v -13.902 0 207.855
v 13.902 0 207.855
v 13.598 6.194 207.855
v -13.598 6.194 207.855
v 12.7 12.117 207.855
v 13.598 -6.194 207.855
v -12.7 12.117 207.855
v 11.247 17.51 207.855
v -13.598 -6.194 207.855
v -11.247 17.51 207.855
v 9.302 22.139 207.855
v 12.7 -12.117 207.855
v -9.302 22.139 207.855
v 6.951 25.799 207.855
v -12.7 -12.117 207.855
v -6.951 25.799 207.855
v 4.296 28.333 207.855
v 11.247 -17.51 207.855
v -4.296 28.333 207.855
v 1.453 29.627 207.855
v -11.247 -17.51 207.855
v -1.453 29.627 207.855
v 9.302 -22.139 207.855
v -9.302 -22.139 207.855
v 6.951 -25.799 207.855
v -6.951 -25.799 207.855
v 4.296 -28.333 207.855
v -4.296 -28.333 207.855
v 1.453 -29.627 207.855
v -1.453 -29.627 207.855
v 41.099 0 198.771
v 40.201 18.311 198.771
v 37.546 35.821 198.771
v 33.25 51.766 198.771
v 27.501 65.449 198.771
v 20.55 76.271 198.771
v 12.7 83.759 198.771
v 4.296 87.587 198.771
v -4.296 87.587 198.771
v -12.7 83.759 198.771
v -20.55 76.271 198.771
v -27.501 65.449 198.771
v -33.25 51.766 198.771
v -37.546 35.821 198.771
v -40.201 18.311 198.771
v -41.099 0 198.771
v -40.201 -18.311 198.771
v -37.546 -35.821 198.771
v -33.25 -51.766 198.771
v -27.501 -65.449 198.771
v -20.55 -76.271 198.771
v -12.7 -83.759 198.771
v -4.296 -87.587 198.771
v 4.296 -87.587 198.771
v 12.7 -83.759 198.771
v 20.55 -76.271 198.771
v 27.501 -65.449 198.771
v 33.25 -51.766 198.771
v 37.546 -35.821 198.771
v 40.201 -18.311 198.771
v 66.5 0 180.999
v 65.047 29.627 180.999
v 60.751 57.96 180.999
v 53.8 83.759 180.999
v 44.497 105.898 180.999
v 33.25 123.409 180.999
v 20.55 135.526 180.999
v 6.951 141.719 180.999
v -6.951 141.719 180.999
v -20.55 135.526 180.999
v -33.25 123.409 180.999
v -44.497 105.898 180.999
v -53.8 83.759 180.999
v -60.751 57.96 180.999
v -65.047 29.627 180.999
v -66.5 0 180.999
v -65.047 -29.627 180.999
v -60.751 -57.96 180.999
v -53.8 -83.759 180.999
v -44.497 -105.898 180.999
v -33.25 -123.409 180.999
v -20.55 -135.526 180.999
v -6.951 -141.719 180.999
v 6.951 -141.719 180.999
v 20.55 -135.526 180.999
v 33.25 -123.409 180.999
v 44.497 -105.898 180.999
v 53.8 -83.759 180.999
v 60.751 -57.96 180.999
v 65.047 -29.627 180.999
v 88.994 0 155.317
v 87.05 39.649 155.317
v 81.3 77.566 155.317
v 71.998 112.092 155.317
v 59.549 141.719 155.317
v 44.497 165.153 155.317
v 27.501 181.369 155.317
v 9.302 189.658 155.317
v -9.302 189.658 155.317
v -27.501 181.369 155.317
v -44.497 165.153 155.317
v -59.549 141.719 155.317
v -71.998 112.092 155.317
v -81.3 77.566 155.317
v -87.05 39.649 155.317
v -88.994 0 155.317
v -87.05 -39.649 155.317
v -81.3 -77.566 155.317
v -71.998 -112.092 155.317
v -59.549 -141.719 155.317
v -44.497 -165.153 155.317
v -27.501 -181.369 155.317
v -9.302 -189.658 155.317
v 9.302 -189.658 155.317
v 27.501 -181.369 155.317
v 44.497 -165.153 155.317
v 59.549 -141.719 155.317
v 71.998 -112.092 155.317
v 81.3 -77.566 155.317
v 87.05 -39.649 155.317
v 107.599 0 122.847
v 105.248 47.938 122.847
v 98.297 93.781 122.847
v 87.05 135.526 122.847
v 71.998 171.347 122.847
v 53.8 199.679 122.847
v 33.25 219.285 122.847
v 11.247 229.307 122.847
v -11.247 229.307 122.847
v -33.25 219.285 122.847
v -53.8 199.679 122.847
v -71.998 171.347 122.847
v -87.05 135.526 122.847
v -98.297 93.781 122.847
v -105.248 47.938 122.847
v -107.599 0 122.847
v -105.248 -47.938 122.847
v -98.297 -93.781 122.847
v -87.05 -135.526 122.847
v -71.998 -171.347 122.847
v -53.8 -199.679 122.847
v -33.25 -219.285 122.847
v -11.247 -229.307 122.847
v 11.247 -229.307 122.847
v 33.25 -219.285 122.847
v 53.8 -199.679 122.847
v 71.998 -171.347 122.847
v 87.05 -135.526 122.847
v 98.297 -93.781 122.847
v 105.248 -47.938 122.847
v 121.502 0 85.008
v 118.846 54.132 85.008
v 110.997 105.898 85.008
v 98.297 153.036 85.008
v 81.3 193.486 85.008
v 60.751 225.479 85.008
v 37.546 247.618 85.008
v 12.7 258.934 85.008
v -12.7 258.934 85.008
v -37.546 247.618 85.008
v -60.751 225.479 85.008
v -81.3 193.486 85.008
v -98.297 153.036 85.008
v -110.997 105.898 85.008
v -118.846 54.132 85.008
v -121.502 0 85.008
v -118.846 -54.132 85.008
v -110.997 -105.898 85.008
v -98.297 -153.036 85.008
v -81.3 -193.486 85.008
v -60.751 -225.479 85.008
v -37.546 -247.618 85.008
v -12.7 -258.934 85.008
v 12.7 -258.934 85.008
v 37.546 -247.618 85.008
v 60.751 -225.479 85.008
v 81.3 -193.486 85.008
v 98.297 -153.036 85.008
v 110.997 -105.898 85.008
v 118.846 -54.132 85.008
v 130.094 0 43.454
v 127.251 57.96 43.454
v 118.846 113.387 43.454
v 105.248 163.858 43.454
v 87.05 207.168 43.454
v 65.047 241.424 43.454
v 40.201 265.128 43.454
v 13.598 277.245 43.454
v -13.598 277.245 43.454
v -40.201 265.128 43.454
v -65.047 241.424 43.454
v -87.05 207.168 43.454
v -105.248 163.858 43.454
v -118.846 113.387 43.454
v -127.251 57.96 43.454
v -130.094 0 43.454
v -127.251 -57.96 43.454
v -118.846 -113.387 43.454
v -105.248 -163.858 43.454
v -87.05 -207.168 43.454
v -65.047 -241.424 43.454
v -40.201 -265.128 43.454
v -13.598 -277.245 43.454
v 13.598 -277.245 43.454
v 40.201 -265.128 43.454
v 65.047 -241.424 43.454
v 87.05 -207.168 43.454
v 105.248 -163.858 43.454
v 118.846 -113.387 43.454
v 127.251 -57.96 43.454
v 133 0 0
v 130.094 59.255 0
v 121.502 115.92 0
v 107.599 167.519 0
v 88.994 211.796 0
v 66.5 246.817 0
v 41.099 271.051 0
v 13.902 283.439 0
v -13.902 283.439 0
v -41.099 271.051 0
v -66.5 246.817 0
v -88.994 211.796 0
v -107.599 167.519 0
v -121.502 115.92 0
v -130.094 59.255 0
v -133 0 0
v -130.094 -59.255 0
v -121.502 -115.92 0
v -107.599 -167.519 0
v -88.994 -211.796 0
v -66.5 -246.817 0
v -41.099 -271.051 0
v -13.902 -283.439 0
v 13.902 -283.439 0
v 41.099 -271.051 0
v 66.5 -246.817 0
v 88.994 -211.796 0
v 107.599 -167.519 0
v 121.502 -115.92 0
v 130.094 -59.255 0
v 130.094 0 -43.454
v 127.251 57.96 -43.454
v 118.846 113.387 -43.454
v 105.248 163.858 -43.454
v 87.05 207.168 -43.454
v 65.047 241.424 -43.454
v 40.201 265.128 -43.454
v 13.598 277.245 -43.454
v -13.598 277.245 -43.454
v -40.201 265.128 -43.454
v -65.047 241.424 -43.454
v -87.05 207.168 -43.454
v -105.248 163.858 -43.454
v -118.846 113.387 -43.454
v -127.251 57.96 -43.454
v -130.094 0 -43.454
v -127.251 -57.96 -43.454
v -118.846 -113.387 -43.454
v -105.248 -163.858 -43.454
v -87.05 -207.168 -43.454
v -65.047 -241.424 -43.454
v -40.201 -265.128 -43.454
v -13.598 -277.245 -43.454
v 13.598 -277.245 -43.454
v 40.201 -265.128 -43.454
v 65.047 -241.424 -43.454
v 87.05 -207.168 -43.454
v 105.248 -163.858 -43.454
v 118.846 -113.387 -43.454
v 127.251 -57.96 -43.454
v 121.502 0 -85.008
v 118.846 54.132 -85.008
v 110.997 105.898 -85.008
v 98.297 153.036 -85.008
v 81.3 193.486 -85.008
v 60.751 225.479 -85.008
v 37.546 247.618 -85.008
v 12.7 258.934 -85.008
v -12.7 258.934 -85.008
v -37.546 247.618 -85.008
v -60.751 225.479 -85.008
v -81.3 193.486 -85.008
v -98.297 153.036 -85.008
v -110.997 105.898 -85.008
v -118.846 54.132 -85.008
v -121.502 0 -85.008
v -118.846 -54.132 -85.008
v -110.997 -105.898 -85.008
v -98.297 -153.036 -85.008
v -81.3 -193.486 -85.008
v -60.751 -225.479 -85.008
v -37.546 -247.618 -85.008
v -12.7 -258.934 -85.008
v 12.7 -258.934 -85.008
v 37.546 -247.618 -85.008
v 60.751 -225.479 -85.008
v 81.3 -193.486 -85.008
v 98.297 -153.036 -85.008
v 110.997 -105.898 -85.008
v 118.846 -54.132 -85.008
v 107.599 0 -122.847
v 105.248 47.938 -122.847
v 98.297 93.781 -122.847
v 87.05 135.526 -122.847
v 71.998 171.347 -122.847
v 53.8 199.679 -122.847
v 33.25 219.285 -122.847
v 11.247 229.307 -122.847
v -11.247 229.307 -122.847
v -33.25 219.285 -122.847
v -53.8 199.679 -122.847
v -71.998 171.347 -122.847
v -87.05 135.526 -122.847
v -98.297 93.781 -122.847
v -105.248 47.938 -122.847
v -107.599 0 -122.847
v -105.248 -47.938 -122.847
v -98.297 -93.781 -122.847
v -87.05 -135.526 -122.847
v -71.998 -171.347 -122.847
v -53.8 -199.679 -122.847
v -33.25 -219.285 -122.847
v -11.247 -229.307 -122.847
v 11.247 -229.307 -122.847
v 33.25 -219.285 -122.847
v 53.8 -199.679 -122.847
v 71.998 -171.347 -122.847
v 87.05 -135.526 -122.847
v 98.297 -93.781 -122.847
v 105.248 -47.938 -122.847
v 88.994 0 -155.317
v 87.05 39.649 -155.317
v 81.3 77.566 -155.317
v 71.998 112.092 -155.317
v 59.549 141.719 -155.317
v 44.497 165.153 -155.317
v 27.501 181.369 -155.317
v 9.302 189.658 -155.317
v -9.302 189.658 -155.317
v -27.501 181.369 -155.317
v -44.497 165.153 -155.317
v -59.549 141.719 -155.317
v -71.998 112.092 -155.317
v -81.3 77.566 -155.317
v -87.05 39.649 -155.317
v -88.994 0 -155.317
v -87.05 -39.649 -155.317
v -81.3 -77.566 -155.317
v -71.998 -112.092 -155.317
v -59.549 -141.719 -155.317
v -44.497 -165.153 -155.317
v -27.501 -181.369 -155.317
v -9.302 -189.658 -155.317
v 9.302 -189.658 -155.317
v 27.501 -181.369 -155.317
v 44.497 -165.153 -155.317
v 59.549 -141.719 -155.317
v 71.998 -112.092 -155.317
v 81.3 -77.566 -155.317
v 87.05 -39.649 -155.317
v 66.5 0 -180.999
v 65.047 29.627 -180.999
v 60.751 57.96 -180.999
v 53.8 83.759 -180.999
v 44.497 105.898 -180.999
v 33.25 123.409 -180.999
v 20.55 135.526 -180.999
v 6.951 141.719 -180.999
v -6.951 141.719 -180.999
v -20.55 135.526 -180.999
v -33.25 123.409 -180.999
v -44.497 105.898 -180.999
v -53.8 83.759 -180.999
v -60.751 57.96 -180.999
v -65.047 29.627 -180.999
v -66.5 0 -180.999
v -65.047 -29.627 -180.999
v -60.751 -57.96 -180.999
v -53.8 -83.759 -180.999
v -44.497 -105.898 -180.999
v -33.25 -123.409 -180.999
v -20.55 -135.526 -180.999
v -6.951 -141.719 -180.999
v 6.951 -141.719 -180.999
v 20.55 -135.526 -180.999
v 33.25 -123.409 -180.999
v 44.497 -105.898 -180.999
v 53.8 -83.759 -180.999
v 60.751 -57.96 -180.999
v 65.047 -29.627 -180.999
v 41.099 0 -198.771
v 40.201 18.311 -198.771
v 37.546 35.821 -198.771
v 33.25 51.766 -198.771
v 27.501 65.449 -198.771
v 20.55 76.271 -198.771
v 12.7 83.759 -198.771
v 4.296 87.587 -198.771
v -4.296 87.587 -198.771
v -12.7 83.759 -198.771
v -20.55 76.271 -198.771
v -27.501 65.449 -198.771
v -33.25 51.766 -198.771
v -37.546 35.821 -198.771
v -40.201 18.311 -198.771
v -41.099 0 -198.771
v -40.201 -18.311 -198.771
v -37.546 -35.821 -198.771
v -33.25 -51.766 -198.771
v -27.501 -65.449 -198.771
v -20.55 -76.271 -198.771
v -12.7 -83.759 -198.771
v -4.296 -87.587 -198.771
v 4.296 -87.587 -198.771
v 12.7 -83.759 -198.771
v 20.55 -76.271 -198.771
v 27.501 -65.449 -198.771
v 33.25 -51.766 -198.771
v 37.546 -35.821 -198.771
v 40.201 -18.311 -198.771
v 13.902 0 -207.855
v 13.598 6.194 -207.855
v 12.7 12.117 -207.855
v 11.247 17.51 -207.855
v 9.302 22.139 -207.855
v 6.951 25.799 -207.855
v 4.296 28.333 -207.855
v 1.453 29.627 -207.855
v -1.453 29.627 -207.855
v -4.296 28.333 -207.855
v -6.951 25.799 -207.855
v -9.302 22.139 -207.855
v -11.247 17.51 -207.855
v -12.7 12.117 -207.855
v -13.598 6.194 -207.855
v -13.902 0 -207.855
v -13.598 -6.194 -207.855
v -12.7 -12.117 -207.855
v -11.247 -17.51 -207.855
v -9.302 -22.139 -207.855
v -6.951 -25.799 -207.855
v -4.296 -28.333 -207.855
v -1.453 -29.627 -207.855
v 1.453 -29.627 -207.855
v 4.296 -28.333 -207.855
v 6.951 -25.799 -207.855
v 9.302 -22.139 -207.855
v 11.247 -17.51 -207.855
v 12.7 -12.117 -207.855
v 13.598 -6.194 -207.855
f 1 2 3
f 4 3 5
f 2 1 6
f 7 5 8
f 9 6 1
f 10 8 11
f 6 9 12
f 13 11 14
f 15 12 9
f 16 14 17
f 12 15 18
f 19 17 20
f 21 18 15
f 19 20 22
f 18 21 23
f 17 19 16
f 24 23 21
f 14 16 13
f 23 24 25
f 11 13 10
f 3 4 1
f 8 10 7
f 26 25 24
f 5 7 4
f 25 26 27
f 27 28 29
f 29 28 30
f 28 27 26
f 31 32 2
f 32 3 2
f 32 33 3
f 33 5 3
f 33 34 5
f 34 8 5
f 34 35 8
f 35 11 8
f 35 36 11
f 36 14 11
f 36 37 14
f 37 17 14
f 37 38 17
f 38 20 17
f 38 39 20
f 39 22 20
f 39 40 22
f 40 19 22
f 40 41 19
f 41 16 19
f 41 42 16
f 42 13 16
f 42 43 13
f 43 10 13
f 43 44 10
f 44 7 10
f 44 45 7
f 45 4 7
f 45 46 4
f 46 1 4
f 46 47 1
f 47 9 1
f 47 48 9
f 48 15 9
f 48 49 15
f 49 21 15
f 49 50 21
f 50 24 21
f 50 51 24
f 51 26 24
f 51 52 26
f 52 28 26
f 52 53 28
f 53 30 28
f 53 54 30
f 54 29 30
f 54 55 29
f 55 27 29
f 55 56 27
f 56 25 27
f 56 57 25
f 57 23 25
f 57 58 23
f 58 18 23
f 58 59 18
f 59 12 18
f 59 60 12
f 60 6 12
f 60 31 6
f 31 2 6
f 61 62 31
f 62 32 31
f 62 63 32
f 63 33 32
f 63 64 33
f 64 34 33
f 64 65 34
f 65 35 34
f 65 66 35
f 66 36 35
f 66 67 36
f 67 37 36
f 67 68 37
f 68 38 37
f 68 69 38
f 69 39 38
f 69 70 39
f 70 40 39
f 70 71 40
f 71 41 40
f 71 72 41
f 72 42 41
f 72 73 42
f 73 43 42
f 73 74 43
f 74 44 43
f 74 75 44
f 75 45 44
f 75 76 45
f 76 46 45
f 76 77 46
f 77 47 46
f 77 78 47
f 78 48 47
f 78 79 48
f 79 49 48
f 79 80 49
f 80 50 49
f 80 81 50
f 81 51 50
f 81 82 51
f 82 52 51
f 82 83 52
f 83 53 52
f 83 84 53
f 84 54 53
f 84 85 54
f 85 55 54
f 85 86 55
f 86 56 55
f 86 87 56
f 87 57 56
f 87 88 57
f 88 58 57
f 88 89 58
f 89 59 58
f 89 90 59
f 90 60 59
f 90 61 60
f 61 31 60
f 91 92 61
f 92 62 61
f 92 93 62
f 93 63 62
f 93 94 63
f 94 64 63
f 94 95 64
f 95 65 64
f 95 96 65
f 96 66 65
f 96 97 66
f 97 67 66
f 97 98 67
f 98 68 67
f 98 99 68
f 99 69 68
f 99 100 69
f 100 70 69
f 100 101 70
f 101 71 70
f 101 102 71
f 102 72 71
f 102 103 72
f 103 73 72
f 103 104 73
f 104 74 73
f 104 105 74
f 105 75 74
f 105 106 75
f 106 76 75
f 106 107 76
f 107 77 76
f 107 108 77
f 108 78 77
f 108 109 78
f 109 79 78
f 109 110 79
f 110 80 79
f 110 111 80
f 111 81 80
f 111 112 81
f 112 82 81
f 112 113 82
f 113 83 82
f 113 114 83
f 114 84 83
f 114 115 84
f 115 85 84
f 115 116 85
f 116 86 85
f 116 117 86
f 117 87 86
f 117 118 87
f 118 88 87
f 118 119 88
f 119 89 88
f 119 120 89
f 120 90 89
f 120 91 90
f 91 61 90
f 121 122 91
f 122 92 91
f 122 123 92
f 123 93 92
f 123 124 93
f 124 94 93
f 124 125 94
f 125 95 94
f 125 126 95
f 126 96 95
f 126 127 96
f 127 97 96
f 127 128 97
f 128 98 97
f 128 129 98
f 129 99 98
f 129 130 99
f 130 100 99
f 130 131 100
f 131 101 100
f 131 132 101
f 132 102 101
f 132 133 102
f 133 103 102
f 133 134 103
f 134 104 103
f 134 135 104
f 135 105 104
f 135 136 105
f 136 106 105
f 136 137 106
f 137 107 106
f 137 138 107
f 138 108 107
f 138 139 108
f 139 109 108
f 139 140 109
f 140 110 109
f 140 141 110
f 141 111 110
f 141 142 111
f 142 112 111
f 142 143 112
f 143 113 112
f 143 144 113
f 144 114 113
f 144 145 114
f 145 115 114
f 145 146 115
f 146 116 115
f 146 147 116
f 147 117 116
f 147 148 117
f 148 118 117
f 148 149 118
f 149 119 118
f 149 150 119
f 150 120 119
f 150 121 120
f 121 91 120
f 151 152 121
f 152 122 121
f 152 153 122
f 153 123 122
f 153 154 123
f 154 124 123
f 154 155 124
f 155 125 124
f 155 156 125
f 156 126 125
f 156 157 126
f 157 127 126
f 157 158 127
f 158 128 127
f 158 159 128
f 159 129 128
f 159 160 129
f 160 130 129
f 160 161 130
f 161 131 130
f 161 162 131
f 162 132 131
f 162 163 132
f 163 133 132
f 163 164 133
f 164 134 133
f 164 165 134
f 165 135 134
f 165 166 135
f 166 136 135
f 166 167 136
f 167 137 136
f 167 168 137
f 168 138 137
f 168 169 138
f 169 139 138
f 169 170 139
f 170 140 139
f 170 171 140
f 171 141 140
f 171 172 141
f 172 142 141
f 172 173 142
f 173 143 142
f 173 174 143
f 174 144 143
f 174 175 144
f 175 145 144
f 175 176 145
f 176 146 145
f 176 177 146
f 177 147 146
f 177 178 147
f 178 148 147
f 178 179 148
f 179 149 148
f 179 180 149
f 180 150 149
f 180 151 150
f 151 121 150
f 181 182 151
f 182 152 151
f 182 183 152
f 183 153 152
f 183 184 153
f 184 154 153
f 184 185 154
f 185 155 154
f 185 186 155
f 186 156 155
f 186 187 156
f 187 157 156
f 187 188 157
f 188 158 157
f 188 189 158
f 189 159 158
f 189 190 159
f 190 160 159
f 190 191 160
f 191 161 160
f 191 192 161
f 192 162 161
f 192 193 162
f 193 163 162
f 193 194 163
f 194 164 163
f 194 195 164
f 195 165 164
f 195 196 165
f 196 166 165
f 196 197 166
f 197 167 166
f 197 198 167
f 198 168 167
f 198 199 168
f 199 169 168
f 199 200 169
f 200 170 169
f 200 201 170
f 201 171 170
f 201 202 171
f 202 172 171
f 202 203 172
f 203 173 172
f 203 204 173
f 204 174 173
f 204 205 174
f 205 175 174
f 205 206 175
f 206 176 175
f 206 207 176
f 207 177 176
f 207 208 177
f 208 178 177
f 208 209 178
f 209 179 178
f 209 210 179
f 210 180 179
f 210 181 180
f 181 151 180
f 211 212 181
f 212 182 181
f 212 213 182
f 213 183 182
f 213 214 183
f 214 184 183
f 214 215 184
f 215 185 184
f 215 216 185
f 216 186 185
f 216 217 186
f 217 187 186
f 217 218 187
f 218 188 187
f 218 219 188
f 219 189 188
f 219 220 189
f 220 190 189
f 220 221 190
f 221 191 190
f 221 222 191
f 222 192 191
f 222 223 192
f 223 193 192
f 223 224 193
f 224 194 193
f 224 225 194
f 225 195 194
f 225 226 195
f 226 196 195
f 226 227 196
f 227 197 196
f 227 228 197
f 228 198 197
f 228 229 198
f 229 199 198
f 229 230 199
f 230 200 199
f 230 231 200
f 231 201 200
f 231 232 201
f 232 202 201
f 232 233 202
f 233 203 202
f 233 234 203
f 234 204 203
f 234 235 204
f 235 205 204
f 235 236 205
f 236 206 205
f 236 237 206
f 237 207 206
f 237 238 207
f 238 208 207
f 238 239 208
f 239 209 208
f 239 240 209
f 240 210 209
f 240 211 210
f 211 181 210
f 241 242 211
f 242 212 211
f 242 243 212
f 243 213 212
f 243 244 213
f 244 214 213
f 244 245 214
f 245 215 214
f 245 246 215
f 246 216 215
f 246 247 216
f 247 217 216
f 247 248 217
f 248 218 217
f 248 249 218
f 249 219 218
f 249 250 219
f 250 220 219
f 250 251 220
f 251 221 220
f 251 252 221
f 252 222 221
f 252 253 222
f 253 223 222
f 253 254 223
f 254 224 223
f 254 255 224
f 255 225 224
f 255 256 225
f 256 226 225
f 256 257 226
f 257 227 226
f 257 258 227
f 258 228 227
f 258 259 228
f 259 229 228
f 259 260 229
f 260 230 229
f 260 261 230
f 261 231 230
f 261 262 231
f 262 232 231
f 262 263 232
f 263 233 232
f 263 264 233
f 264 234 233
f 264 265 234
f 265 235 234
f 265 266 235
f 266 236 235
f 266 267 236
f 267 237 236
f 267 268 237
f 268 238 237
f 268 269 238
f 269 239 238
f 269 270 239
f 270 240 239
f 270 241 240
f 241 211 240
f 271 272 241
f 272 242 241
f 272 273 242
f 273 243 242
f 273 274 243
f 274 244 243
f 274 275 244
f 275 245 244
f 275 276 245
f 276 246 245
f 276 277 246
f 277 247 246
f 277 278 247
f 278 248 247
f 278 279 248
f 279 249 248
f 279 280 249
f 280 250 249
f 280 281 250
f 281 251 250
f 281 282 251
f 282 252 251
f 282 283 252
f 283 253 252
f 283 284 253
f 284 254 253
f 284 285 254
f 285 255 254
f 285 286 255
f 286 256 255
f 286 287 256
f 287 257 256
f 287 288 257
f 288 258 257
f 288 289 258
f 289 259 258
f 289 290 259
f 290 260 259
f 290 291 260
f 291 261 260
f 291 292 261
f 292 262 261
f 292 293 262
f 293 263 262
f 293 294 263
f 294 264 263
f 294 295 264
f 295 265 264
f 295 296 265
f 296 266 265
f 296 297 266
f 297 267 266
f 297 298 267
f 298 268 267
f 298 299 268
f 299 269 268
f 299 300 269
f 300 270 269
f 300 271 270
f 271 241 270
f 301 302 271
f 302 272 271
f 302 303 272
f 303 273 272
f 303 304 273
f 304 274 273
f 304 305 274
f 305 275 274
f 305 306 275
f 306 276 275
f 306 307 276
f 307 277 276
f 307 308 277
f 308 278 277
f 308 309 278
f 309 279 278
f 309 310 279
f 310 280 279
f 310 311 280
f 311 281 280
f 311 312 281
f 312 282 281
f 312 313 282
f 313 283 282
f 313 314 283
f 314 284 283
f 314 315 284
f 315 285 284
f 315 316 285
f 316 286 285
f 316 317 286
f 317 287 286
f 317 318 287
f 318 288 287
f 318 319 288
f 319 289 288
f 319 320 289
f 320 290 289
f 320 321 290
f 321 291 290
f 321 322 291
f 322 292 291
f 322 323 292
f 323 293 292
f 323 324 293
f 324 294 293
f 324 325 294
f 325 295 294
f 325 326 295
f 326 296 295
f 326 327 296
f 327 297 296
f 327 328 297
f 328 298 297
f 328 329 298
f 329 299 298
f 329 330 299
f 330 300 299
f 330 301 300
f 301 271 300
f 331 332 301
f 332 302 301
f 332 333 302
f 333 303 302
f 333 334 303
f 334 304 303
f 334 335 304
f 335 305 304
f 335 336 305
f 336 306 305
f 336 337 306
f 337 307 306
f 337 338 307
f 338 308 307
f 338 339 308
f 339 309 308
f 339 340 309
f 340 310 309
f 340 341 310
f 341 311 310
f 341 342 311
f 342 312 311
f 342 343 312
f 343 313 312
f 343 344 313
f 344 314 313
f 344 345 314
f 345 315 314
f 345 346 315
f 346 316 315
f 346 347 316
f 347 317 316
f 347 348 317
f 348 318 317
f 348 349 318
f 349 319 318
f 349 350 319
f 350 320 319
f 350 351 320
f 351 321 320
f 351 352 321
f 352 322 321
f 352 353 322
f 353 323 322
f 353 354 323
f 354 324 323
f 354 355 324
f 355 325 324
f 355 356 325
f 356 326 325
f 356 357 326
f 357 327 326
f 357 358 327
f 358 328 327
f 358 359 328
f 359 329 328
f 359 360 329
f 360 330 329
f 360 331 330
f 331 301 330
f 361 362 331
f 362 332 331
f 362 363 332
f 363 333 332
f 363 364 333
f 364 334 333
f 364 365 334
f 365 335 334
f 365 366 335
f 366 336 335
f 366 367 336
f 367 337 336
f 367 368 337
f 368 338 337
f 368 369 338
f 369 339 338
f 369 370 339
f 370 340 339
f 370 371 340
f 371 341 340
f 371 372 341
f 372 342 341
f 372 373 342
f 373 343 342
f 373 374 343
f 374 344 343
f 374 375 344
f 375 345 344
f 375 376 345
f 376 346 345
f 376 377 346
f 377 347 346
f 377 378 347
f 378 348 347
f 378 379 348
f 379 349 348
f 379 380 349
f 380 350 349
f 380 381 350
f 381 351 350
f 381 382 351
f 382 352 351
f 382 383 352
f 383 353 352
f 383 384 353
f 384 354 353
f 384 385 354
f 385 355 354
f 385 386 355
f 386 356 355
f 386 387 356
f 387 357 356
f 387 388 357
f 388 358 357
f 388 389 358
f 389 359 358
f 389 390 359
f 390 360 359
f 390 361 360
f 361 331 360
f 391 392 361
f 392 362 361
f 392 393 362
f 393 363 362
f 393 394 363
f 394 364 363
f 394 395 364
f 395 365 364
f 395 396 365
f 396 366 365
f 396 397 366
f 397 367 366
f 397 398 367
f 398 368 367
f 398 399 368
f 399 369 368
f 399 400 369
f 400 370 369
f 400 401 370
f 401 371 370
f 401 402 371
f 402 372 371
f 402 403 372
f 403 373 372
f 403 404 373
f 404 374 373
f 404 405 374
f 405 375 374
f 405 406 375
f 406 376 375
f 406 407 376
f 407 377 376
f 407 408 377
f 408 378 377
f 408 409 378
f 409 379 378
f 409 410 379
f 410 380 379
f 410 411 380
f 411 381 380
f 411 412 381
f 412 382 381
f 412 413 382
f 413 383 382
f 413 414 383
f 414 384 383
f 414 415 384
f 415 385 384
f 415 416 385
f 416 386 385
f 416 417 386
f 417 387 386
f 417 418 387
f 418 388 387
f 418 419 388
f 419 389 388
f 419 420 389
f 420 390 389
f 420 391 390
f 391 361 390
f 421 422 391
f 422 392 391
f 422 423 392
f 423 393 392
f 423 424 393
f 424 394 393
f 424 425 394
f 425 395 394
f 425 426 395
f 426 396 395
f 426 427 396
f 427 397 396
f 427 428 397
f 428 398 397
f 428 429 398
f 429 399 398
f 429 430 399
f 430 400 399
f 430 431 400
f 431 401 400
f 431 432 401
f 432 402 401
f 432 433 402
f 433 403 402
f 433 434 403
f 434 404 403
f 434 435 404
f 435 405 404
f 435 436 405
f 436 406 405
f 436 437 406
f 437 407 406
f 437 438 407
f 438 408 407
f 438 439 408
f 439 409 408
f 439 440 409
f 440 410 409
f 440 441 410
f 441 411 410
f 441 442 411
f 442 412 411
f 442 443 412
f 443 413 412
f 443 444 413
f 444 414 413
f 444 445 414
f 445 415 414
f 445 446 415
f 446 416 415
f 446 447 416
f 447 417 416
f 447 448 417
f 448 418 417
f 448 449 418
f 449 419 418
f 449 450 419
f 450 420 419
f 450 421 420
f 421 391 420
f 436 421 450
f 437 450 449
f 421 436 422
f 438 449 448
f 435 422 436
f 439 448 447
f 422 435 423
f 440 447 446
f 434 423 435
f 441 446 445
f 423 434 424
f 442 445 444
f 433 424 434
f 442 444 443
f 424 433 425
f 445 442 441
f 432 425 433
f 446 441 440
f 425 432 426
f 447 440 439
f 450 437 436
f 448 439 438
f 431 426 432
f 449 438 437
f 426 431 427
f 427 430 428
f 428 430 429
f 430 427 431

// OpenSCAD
// Generated by SolidPython 1.0.1 on 2020-07-29 00:46:48


scale(v = [7, 15, 11]) {
	sphere(r = 19);
}
/***********************************************
*********      SolidPython code:      **********
************************************************
 
# import packages: SolidPython
from solid import *
from solid.utils import *
from itertools import chain, combinations, permutations


class Resize:

    def __init__(self, scad_file):
        self.scad_file = scad_file
        #self.scad_file = import_scad(scad_file)
        # cone/cylinder param:
        self.r1 = 0
        self.r2 = 0
        self.h = 0
        # rectangular prism param:
        self.w = 0
        self.l = 0
        # ellipse param:
        self.r = 0

    # import OpenScad code (file name corresponds to shape)


    # classify shape + parameters
    def assign(self, param1, param2, param3):
        if self.scad_file == 'cone.scad':
            self.r1 = param1
            self.r2 = param2
            self.h = param3
        elif self.scad_file == 'cylinder.scad':
            self.r1 = param1
            self.r2 = param2
            self.h = param3
        elif self.scad_file == 'rectangularPrism.scad':
            self.h = param1
            self.l = param2
            self.w = param3
        else:
            self.r = param1
            self.h = param2

    # resize parameters
    def iterate(self):
        x = range(3, 20, 2)
        i = 1
        if self.scad_file == 'cone.scad':
            tempList = list(permutations(x, 2))
            for temp in tempList:
                param1 = temp[0]
                param2 = temp[1]
                filepath = 'produced_scad_files/' + 'cone' + str(param1) + '_' + str(param2) + '_' + '.scad'
                scad_render_to_file(cylinder(h=param1, r1=param2, r2=0), filepath)

        elif self.scad_file == 'cylinder.scad':
            tempList = list(permutations(x, 3))
            for temp in tempList:
                param1 = temp[0]
                param2 = temp[1]
                filepath = 'produced_scad_files/' + 'cylinder' + str(param1) + '_' + str(param2) + '_' + '.scad'
                scad_render_to_file(cylinder(h=param1, r1=param2, r2=param2), filepath)

        elif self.scad_file == 'rectangularPrism.scad':
            tempList = list(permutations(x, 3))
            for temp in tempList:
                param1 = temp[0]
                param2 = temp[1]
                param3 = temp[2]
                filepath = 'produced_scad_files/' + 'rectangularPrism' + str(param1) + '_' + str(param2) + '_' + str(
                    param3) + '.scad'
                scad_render_to_file(cube(size=(param1, param2, param3)), filepath)

        elif self.scad_file == 'ellipse.scad':
            tempList = list(permutations(x, 4))
            for temp in tempList:
                param1 = temp[0]
                param2 = temp[1]
                param3 = temp[2]
                param4 = temp[3]
                filepath = 'produced_scad_files/' + 'ellipse' + str(param1) + '_' + str(param2) + '_' + str(param3) + '_' + str(param4) + '.scad'
                scad_render_to_file(scale([param1, param2, param3])(sphere(r=param4)), filepath)

    def render_to_scadfile(self):
        scad_render_to_file(scad, 'example.scad') 
 
************************************************/
